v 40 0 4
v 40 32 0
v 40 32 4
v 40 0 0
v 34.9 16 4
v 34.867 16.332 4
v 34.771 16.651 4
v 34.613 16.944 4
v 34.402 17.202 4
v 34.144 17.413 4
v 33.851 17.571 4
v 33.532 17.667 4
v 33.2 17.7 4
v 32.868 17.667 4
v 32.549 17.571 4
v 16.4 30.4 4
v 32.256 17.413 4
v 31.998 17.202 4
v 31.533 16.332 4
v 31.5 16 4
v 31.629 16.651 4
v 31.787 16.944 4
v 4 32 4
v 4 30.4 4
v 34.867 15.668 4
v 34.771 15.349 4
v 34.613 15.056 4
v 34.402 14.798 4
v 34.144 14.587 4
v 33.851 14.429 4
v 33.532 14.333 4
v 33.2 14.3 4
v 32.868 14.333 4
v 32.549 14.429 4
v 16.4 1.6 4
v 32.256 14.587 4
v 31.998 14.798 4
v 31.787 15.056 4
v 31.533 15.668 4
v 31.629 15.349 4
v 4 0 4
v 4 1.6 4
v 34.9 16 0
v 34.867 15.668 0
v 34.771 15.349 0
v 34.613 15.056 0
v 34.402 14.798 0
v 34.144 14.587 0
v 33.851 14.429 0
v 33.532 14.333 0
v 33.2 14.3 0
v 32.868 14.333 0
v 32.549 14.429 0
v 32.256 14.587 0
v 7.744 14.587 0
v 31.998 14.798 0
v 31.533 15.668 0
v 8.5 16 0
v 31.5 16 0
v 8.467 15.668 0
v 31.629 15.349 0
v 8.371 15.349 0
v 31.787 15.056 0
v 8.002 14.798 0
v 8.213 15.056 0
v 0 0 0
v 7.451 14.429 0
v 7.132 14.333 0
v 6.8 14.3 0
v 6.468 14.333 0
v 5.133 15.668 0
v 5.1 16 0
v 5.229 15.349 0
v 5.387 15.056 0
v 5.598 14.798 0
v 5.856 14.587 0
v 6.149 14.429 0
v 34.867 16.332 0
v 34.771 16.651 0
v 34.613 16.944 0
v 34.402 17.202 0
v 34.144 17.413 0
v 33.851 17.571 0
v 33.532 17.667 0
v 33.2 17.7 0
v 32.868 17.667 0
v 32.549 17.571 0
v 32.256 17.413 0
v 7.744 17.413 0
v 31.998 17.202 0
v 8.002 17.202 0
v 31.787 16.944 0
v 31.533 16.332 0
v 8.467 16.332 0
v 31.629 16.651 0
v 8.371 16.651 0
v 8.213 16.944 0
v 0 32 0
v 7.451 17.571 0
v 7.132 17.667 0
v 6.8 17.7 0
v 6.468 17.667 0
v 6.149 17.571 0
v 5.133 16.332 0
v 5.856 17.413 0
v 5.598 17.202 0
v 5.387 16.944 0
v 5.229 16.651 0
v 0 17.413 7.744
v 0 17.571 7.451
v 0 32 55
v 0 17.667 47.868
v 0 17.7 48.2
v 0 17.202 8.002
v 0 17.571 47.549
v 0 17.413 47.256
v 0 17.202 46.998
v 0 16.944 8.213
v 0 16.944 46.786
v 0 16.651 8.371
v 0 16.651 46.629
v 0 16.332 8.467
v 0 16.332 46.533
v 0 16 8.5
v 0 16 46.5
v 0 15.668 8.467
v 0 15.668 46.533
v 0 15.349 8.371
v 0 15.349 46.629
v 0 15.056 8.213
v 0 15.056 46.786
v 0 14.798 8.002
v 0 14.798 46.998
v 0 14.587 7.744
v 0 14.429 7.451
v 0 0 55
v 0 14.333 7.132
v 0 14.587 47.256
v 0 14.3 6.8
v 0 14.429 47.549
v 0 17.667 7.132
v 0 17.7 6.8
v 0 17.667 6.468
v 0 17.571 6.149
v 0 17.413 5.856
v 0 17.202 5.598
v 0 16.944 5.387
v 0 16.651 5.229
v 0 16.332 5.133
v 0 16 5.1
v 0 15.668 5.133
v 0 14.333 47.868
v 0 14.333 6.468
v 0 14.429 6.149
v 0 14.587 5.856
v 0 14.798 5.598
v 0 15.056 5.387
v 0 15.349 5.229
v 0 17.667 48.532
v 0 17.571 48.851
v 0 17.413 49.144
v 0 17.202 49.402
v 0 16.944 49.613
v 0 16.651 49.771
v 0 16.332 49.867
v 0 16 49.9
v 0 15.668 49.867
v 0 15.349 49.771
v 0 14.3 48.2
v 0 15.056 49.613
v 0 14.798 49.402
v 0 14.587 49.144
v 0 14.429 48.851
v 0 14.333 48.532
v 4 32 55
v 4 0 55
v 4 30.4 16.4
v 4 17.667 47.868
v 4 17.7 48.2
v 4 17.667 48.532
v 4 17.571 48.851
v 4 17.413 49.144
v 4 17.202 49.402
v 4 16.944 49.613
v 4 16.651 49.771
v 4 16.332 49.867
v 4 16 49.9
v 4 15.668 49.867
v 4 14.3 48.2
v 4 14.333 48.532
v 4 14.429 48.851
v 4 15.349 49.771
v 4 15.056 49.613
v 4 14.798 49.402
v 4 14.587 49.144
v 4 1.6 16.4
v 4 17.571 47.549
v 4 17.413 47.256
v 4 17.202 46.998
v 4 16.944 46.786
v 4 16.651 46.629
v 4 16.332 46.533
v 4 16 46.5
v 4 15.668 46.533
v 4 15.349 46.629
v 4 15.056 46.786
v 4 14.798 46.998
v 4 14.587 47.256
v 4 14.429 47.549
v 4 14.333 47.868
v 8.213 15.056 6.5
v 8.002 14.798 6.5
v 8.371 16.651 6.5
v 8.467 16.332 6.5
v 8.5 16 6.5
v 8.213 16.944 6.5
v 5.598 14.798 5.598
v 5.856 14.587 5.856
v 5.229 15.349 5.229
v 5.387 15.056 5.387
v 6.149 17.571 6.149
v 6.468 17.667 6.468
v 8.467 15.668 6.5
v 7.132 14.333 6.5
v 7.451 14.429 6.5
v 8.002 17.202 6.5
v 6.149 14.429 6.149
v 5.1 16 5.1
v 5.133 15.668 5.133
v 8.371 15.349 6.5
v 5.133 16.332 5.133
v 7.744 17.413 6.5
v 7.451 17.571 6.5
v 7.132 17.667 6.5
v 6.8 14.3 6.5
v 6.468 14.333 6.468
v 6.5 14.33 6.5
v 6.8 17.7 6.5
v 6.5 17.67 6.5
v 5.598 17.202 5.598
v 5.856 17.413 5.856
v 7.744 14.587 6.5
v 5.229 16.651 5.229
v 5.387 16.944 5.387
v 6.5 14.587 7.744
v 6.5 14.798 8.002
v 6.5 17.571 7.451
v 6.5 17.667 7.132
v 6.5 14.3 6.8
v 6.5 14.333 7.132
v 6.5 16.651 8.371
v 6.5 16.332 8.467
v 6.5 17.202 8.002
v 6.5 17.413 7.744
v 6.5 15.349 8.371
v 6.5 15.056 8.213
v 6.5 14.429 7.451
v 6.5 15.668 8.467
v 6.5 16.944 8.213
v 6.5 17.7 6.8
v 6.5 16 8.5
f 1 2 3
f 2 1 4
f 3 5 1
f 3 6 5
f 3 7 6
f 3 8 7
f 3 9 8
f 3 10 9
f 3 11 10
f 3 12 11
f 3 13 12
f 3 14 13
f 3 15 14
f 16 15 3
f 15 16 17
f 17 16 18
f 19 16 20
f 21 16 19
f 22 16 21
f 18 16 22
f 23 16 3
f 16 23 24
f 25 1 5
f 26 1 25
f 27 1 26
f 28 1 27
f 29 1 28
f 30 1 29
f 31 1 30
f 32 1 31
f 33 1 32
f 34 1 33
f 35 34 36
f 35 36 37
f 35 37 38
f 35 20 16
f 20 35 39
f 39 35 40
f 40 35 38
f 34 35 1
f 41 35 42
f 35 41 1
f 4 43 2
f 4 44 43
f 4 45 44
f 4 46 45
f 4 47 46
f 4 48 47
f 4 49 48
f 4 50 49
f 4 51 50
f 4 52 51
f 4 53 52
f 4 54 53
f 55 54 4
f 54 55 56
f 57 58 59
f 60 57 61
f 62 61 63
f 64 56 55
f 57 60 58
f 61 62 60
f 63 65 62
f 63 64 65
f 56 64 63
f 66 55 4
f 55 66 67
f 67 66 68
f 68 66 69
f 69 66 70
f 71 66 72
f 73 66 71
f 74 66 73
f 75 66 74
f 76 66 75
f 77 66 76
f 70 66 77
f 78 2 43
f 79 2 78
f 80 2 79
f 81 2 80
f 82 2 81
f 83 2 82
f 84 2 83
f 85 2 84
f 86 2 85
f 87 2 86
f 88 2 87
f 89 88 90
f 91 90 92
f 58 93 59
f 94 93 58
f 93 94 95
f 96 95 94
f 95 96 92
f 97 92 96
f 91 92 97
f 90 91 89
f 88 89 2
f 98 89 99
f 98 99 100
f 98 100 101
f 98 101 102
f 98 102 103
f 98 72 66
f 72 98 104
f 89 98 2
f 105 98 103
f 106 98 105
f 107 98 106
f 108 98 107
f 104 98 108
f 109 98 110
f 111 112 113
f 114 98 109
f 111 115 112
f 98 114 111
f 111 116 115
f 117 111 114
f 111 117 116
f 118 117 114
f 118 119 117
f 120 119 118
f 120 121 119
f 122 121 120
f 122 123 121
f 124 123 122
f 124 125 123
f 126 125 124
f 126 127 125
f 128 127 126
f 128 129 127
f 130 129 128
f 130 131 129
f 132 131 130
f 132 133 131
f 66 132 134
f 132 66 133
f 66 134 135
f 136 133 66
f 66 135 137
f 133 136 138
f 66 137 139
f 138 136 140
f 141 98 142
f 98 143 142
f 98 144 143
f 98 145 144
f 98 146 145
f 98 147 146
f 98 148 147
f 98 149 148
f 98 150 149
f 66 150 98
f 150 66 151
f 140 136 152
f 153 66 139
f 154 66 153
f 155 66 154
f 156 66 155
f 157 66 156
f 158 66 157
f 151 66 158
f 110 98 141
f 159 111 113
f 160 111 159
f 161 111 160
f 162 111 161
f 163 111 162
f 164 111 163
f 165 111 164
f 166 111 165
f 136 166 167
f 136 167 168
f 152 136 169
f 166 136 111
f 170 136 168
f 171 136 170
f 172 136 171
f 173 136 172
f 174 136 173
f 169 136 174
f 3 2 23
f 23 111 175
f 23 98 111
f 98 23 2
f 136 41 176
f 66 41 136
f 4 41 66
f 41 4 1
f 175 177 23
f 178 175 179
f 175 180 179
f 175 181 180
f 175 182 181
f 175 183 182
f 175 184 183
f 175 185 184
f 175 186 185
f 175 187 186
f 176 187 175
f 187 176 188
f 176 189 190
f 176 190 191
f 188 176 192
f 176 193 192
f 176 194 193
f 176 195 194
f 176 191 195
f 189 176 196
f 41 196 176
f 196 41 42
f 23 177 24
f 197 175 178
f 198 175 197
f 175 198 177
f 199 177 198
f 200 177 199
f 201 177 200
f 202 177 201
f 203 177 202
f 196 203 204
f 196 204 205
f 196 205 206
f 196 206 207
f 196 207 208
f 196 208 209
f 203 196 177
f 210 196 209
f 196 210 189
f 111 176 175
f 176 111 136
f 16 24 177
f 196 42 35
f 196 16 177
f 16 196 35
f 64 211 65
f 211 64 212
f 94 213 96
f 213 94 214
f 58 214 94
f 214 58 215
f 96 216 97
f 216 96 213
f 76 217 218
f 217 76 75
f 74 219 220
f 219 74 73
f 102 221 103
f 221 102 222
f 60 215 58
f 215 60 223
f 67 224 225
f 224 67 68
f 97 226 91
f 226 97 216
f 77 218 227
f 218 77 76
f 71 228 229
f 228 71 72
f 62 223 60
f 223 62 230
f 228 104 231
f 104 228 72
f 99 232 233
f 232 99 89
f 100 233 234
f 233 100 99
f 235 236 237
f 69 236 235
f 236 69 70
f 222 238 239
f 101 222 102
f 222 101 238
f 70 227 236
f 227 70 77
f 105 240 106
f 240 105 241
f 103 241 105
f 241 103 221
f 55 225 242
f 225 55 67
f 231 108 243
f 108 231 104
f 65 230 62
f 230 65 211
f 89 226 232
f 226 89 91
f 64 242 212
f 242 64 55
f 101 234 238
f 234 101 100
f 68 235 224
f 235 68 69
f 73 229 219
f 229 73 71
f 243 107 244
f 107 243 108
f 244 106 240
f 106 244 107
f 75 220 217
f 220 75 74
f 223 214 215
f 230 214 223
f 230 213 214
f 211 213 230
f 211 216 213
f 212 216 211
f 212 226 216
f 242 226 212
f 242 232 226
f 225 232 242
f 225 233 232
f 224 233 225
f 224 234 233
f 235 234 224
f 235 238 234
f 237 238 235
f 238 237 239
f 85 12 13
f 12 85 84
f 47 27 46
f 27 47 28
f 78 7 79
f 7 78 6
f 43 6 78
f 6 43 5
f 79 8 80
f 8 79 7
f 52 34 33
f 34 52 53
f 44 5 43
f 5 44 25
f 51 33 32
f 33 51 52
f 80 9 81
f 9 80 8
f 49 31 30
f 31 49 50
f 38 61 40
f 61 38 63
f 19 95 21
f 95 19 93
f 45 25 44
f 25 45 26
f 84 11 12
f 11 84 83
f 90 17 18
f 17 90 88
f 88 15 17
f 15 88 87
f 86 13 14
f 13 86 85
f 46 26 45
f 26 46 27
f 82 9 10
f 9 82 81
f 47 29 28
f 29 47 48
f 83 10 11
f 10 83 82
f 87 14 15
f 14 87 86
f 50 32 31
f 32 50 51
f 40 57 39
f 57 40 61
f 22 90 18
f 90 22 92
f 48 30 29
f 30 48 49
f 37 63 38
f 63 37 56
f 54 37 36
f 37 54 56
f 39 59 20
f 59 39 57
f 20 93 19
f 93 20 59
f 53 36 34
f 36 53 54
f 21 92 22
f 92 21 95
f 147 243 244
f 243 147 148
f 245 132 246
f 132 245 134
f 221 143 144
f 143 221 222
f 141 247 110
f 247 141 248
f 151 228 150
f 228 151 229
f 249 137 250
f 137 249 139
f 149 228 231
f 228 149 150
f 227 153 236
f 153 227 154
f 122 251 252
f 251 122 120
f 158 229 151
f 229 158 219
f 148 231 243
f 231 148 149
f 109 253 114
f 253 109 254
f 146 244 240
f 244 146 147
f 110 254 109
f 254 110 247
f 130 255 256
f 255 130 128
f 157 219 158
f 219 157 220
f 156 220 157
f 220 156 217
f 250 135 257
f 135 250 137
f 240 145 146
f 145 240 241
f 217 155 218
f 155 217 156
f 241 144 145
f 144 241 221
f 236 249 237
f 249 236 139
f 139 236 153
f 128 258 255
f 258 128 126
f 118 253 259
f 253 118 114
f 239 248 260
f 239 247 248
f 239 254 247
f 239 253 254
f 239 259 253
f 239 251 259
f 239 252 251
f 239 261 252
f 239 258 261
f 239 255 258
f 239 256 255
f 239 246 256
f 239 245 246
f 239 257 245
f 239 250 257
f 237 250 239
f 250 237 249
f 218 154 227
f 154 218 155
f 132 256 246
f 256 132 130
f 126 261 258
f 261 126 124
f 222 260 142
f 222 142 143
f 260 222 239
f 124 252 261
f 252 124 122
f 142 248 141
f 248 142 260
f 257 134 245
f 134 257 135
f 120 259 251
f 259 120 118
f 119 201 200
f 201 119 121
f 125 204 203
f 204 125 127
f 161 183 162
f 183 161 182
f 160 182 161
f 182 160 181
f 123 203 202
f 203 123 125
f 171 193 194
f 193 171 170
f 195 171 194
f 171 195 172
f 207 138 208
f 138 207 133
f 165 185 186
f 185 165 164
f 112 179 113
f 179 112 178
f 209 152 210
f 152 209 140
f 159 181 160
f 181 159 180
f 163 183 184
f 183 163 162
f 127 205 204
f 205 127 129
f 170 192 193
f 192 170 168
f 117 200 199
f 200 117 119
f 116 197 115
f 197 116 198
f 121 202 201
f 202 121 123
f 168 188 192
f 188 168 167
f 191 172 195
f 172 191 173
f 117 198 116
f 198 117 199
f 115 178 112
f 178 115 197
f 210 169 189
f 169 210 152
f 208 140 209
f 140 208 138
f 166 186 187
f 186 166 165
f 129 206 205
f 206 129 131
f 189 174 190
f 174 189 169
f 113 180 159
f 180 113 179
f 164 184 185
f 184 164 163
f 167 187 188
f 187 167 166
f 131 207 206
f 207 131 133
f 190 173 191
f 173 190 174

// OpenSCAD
$fn = 32;

// ----------------------------------------------------------------------
// L-bracket: 40 x 32 x 55 mm
// ----------------------------------------------------------------------

// --- parameters (mm) ---
base_len = 40;            // horizontal leg, X
upright_h = 55;           // vertical leg, Z
flange_w = 32;            // bracket depth, Y
mat_t = 4;                // plate thickness
hole_d = 3.4;             // clearance for M3
rib_leg = 18.8;           // gusset leg
rib_sink = 1.6;           // gusset overlap into the plates

module hole_z(px, py) {
  translate([px, py, -2.5]) cylinder(h = mat_t + 5, d = hole_d);
}
module hole_x(pz, py) {
  translate([-2.5, py, pz]) rotate([0, 90, 0]) cylinder(h = mat_t + 5, d = hole_d);
}
module gusset() {
  translate([0, flange_w - rib_sink, 0])
    rotate([90, 0, 0])
      linear_extrude(height = flange_w - 2 * rib_sink)
        polygon(points = [[rib_sink, rib_sink], [rib_leg, rib_sink], [rib_sink, rib_leg]]);
}

difference() {
  union() {
    /* horizontal leg */
    cube([base_len, flange_w, mat_t]);
    /* vertical leg, overlapping the corner block */
    cube([mat_t, flange_w, upright_h]);
    gusset();
  }
  hole_z(6.8, 16);
  hole_z(33.2, 16);
  hole_x(6.8, 16);
  hole_x(48.2, 16);
}
